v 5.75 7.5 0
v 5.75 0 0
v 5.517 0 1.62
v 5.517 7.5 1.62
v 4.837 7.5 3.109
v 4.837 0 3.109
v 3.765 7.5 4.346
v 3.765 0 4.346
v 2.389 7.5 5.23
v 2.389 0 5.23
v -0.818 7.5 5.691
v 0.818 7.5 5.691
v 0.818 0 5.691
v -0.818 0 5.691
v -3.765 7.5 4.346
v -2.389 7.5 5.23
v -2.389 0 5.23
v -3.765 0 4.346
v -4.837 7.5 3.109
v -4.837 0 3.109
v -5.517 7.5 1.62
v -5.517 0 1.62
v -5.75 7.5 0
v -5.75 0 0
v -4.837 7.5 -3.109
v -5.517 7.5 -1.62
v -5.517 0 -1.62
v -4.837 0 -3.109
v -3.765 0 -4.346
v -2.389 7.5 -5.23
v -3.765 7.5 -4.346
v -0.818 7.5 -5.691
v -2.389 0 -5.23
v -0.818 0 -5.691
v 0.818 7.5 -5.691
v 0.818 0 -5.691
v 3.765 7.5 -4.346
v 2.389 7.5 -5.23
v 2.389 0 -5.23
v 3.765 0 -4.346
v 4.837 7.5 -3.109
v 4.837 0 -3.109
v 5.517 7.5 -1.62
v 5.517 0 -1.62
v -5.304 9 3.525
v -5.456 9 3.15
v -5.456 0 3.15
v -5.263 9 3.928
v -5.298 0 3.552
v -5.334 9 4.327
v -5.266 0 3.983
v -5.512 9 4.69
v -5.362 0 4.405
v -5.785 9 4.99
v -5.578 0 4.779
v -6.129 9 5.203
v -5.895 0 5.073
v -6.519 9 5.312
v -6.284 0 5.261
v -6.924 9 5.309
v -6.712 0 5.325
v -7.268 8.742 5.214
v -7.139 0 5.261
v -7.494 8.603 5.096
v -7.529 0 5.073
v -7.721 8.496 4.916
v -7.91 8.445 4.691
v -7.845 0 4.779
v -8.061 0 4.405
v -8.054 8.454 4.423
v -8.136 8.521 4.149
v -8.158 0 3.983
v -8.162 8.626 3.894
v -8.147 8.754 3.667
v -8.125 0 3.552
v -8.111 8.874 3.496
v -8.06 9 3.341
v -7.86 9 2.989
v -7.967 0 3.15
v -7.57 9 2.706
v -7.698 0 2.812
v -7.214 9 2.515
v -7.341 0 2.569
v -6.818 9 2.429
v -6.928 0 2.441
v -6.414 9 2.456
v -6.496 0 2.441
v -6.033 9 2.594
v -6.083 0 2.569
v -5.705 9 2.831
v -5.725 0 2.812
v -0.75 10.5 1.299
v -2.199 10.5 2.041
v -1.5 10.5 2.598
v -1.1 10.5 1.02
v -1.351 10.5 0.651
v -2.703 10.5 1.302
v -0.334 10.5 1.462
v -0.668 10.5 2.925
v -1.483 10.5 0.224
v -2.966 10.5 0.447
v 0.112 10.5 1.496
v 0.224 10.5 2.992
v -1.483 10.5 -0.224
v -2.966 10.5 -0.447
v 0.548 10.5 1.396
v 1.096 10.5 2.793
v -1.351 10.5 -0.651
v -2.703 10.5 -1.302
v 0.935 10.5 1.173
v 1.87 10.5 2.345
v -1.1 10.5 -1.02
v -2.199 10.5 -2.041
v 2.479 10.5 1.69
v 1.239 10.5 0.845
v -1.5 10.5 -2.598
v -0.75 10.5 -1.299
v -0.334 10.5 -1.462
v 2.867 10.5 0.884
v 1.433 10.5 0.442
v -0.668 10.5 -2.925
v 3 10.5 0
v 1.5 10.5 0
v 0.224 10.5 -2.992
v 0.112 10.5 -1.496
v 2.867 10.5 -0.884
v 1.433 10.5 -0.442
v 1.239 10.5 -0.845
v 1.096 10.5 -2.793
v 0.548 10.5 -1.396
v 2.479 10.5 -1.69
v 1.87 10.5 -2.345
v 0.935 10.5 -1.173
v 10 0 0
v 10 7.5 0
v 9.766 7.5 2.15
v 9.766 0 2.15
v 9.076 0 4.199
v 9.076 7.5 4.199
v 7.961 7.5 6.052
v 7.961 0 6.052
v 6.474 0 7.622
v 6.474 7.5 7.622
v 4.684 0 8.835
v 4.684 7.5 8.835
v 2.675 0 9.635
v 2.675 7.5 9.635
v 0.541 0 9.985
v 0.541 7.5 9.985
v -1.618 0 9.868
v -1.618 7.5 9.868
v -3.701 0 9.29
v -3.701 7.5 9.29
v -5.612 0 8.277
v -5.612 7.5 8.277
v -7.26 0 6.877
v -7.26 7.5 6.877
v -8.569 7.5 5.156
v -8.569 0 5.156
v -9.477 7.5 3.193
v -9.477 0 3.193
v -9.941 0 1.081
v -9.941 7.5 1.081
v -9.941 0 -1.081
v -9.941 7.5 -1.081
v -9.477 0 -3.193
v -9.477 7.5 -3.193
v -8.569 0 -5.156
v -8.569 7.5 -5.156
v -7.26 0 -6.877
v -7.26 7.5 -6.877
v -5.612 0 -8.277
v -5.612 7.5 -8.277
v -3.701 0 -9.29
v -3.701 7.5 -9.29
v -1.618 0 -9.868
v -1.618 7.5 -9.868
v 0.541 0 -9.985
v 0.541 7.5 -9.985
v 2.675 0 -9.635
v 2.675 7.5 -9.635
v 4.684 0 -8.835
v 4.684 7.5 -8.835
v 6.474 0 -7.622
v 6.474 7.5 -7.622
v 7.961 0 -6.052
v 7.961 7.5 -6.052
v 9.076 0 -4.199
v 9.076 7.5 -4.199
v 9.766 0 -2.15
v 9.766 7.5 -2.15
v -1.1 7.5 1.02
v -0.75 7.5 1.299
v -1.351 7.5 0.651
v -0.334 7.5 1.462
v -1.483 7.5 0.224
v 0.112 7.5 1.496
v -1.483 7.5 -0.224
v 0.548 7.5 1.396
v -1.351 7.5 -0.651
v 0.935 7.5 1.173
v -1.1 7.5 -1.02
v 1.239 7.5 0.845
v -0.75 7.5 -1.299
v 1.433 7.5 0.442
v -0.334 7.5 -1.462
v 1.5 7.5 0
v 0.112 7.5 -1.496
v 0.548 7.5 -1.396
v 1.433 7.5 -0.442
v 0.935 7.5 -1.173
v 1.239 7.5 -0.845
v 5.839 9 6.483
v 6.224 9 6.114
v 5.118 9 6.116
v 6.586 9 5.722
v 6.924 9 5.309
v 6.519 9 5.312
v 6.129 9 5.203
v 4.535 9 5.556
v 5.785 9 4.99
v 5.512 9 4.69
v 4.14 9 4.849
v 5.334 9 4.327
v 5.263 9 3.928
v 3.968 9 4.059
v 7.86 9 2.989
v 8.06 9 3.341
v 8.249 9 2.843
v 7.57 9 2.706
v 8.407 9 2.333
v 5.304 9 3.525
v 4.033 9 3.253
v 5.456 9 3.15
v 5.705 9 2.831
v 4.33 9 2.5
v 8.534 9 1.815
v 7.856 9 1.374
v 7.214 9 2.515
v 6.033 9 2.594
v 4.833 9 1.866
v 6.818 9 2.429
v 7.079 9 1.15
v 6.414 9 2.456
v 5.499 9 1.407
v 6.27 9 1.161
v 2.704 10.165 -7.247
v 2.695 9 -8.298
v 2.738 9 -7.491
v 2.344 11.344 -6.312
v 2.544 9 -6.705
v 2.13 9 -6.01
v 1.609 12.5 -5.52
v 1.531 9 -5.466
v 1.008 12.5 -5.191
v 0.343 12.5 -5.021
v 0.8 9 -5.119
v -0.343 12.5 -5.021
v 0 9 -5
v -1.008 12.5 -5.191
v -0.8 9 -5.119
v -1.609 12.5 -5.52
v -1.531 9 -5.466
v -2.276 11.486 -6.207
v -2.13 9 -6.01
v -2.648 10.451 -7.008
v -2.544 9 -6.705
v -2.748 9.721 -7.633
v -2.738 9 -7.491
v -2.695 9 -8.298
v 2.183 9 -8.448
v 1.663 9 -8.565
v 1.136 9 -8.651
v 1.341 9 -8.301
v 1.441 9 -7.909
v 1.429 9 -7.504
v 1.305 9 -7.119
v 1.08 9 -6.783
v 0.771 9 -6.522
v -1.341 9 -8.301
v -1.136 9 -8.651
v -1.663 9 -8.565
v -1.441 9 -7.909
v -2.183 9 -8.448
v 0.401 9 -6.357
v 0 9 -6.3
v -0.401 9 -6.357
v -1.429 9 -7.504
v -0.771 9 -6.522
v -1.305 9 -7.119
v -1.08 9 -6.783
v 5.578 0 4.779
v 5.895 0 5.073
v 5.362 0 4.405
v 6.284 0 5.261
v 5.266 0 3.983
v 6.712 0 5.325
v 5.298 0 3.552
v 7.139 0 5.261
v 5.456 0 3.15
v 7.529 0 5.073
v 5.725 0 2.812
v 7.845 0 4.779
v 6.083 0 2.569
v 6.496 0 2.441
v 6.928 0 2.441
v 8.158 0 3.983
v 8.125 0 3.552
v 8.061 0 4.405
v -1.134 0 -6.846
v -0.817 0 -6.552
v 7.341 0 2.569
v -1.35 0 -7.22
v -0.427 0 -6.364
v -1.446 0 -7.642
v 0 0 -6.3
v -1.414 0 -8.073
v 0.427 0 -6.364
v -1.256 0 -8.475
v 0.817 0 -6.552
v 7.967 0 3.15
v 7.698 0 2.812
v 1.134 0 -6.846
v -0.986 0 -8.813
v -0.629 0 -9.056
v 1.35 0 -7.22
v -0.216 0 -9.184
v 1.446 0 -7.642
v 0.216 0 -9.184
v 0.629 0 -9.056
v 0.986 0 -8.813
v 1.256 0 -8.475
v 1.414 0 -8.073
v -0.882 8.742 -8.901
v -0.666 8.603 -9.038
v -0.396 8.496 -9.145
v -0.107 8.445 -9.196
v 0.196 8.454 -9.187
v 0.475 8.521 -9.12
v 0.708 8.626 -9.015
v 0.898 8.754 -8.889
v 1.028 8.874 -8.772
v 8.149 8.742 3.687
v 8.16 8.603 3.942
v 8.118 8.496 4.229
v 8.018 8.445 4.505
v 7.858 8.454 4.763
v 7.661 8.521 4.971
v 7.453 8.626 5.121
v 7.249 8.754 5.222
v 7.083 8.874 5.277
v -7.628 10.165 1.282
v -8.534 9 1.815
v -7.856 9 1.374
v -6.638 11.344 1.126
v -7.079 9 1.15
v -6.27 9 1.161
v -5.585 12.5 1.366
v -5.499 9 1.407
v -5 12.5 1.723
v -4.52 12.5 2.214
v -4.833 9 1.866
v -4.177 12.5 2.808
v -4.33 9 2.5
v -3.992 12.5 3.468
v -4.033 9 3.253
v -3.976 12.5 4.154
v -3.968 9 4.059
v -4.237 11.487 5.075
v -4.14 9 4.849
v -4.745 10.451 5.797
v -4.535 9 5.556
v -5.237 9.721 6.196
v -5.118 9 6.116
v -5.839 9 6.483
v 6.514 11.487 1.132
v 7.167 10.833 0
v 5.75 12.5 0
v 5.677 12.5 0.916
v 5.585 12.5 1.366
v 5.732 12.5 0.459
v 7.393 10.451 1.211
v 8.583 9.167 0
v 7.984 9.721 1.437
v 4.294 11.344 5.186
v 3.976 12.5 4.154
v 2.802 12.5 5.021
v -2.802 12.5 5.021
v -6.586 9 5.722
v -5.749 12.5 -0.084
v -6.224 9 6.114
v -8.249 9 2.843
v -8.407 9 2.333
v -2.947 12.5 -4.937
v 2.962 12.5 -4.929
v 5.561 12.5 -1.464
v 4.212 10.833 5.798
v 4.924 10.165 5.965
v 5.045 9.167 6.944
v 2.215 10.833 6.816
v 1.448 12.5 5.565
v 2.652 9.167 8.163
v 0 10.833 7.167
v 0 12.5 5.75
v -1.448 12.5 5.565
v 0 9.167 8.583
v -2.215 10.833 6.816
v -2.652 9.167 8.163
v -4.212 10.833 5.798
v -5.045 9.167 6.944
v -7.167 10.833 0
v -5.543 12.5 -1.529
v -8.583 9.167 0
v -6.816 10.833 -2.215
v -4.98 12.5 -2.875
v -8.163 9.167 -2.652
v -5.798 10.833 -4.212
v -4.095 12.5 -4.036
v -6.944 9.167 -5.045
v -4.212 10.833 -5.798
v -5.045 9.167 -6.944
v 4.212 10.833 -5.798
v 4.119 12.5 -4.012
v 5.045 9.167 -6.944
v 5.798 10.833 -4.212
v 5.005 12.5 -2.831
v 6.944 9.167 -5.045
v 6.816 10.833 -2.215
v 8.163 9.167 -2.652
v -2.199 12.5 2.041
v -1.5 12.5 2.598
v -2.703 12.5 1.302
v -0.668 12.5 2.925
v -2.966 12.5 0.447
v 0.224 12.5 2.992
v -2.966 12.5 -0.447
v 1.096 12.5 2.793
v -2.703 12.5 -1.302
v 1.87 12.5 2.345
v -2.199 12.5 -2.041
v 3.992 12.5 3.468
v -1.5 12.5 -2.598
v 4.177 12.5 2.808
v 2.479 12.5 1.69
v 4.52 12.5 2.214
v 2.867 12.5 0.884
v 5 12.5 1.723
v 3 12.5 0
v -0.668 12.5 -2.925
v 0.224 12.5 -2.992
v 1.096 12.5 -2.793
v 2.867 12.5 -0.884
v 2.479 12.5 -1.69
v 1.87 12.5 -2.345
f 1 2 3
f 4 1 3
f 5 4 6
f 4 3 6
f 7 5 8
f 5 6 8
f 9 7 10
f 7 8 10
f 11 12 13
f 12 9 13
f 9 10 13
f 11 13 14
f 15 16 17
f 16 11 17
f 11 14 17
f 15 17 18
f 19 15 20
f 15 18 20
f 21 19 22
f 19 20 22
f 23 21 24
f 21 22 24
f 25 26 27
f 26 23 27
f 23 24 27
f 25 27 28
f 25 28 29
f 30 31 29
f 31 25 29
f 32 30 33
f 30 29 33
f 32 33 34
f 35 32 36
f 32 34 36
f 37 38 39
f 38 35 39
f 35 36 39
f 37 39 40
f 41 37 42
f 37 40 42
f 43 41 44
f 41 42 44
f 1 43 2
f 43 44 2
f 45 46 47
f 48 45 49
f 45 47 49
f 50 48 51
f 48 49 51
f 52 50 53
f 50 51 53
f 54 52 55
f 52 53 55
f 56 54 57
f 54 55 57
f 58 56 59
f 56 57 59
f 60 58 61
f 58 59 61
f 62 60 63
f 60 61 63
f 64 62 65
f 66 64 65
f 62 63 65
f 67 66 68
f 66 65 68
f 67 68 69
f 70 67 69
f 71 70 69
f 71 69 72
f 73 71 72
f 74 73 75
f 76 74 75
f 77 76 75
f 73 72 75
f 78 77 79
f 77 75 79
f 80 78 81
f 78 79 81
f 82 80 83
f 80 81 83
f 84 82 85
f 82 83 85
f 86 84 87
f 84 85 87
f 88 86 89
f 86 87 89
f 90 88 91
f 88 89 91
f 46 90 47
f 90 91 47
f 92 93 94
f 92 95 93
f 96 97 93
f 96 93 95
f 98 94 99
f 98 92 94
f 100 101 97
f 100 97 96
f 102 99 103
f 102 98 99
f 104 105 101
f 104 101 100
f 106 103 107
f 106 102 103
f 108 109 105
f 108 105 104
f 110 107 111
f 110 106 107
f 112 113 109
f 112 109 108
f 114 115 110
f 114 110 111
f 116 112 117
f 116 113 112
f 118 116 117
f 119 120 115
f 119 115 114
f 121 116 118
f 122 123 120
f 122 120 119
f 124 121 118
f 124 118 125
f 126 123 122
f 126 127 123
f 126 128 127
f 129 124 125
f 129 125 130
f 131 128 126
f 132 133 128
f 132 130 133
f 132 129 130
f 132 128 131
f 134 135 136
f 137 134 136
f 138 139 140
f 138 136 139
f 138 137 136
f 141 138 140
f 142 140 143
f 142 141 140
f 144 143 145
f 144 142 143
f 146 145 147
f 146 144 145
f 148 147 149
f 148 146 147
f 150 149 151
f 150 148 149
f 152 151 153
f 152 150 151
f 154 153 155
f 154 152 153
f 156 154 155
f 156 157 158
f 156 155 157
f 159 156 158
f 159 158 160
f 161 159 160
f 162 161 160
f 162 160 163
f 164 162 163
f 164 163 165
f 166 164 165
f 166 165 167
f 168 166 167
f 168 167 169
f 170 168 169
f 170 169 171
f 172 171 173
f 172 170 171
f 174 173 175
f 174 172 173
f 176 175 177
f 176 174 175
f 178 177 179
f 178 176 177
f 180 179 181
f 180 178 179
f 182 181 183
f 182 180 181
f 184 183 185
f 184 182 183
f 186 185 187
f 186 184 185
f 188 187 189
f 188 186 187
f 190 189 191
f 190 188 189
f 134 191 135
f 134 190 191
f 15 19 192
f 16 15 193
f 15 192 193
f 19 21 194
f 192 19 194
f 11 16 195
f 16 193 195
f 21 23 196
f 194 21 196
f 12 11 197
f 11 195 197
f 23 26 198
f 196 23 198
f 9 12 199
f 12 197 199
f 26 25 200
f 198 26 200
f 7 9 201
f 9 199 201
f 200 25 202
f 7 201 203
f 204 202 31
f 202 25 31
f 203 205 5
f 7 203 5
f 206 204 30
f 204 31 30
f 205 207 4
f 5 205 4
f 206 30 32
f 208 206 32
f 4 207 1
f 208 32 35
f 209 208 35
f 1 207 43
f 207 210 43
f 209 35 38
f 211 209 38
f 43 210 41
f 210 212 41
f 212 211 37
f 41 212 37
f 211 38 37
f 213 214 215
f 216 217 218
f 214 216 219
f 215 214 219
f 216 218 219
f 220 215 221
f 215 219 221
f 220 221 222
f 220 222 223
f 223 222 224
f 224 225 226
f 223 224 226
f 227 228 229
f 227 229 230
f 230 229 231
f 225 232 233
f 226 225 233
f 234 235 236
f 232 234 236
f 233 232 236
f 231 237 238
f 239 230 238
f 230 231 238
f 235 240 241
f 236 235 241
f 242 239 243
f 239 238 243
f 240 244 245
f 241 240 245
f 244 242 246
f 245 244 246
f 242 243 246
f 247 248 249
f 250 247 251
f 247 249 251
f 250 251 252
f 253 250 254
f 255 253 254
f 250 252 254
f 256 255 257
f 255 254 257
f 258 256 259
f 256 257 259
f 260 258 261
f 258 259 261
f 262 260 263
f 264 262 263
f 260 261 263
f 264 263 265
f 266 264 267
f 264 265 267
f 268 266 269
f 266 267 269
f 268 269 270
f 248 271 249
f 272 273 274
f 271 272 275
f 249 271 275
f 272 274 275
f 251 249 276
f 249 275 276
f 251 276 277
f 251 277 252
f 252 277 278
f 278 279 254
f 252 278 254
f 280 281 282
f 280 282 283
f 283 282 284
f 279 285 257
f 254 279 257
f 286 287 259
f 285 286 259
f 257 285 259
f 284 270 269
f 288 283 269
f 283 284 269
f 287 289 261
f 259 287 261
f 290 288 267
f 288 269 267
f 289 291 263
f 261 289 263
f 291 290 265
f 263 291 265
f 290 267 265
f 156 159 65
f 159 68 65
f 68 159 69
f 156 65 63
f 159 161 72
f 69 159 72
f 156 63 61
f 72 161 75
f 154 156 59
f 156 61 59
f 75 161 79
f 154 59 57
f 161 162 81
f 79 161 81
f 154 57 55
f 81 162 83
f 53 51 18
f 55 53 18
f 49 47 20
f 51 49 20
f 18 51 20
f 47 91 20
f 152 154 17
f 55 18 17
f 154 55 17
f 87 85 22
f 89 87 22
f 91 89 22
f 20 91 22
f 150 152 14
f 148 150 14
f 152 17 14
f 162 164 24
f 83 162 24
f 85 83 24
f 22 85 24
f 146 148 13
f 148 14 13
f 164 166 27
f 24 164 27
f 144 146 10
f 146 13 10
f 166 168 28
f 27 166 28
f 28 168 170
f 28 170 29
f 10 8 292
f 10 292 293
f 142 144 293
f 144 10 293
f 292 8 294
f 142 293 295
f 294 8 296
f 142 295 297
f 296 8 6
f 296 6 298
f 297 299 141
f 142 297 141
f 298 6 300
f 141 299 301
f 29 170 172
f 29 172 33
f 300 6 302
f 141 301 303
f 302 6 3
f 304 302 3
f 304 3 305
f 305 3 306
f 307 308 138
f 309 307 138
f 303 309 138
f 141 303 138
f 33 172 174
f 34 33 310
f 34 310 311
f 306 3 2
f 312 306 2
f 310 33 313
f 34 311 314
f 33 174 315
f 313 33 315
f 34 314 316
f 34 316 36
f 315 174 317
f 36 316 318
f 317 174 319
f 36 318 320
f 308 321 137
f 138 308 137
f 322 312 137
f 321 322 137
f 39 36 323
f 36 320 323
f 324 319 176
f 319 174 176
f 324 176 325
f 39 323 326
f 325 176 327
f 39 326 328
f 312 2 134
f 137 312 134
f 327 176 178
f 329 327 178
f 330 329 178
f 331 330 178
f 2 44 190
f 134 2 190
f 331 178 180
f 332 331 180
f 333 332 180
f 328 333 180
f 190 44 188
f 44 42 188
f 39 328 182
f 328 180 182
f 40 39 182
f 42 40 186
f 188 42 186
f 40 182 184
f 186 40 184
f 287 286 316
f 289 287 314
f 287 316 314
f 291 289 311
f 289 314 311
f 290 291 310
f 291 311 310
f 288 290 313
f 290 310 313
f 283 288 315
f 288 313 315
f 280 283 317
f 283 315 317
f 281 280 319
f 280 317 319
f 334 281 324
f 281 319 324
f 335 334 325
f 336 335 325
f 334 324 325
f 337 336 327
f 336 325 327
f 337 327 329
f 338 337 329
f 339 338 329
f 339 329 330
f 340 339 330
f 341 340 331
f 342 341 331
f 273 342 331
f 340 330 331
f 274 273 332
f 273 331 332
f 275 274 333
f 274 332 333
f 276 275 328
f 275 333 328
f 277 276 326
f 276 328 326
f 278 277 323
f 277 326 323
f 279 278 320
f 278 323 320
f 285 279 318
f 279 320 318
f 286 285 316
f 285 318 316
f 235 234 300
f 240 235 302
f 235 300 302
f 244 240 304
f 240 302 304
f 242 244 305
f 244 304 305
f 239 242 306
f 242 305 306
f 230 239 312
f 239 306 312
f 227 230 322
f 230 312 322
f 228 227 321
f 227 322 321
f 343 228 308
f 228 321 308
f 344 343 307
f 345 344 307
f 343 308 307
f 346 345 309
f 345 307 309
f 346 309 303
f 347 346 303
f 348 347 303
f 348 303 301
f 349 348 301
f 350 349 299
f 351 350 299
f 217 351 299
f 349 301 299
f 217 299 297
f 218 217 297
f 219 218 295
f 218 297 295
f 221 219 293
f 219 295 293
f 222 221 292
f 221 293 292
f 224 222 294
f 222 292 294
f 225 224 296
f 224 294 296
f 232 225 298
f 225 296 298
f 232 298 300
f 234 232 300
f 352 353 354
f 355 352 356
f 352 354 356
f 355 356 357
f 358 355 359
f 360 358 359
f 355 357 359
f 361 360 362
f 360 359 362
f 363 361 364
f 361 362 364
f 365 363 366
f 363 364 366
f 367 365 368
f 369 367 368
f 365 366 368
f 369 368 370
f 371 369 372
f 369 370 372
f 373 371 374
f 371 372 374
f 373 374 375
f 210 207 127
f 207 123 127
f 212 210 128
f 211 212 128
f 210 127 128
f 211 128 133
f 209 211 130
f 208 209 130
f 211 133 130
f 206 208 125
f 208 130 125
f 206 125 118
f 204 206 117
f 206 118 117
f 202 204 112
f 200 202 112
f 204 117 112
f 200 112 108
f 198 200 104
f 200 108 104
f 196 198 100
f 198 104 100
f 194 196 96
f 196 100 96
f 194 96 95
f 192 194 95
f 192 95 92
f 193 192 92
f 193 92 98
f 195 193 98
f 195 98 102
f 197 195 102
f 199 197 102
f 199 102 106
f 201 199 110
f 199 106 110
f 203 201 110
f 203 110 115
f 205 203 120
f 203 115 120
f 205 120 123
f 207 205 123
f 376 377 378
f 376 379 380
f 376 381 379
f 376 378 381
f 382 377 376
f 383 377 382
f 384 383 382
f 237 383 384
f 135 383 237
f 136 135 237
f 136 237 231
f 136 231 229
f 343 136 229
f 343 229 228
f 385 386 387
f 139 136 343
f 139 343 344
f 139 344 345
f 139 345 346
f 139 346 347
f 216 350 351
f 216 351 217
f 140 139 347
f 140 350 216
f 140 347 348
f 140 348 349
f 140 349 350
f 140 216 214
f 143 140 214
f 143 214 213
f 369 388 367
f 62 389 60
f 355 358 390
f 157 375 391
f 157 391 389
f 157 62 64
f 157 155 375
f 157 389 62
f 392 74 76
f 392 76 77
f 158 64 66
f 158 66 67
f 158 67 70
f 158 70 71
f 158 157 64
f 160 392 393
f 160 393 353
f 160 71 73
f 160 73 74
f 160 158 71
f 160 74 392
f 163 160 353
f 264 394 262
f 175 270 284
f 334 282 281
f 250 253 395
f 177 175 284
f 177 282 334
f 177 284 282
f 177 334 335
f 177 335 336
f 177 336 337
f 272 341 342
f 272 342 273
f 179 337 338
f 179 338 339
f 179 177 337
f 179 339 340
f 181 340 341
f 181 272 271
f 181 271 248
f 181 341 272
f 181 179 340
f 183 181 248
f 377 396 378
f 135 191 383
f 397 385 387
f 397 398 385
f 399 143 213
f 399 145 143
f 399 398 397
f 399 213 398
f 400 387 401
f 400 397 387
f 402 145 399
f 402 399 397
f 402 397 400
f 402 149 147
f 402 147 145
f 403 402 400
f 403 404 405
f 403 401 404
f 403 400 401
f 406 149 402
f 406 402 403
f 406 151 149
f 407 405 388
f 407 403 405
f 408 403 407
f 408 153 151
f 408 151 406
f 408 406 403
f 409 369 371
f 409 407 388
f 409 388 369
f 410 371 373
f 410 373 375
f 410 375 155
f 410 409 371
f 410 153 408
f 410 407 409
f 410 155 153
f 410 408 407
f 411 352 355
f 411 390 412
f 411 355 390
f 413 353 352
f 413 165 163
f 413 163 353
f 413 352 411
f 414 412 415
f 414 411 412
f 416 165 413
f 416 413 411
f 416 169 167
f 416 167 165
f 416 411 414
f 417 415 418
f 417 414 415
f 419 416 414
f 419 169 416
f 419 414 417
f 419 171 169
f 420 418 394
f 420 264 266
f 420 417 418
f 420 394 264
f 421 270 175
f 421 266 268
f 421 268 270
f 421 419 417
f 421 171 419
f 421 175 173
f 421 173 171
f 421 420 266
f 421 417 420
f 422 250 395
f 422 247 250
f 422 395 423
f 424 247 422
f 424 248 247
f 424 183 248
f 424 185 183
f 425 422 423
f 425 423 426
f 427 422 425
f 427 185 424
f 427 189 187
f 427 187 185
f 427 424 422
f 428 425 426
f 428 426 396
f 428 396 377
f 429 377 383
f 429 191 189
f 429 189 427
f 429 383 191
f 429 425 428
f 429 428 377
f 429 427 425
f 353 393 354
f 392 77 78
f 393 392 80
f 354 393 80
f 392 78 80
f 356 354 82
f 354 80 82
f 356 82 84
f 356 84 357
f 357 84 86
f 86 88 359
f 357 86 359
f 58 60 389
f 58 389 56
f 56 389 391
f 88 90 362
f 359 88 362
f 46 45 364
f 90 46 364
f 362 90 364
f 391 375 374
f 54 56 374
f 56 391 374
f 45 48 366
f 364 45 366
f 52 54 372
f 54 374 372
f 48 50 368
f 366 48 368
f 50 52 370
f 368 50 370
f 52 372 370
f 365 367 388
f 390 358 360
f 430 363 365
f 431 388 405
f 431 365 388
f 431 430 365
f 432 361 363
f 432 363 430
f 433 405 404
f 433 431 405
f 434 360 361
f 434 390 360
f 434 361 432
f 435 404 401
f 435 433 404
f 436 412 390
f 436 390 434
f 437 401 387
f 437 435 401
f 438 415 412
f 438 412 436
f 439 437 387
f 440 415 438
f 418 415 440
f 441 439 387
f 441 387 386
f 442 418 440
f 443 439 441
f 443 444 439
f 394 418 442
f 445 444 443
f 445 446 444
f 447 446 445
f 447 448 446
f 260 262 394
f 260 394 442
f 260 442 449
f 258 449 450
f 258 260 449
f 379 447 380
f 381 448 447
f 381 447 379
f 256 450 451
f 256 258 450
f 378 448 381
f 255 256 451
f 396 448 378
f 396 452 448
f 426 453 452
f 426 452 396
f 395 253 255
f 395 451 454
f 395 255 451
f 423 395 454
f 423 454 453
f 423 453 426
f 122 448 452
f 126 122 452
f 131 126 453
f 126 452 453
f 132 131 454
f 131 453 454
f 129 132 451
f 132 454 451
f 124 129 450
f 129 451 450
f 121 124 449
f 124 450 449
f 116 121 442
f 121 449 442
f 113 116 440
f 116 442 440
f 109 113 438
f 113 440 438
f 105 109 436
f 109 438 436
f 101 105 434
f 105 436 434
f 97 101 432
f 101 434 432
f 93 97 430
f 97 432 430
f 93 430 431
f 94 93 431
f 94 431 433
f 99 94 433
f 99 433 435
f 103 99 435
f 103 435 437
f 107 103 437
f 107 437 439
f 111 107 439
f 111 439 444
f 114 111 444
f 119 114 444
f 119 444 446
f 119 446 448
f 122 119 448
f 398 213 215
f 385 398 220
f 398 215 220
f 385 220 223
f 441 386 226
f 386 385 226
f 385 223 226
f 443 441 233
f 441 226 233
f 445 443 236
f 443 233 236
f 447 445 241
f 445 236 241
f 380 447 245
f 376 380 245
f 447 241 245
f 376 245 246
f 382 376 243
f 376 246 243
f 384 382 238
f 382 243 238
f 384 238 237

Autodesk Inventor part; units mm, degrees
ref_plane "YZ Plane" through (0, 0, 0) normal (1, 0, 0) x (0, 1, 0)
ref_plane "XZ Plane" through (0, 0, 0) normal (0, 1, 0) x (-1, 0, 0)
ref_plane "XY Plane" through (0, 0, 0) normal (0, 0, 1) x (1, 0, 0)
sketch "Sketch2" plane through (0, 0, 0) normal (0, 0, 1) x (1, 0, 0)
  line L0 (1.5, 7.5) -> (1.5, 10.5)
  line L1 (1.5, 10.5) -> (3, 10.5)
  line L2 (3, 10.5) -> (3, 12.5)
  line L3 (3, 12.5) -> (5.75, 12.5)
  line L4 (5.75, 12.5) -> (10, 7.5)
  line L5 (10, 7.5) -> (10, 0)
  line L6 (1.5, 7.5) -> (5.75, 7.5)
  line L7 (5.75, 7.5) -> (5.75, 0)
  line L8 (5.75, 0) -> (10, 0)
  line L9 (0, 0) -> (0, 19.425)
  dimension "d0" = 6
  dimension "d1" = 3
  dimension "d2" = 11.5
  dimension "d3" = 20
  dimension "d4" = 7.5
  dimension "d5" = 3
  dimension "d6" = 2
revolve "Revolution1" add sketch "Sketch2" angle 360 about axis through (0, 0, 0) along (0, 1, 0)
sketch "Sketch3" plane through (0, 12.5, 0) normal (0, 1, 0) x (1, 0, 0)
  point P0 (0, 0)
  point P1 (0, 7.75)
  dimension "d8" = 7.75
hole "Hole1" at (0, 12.5, -7.75) direction (0, -1, 0) diameter 2.9 end through all counterbore diameter 5.5 counterbore depth 3.5 clearance for "Socket Head Cap Screw DIN EN ISO 4762" size "M2.5" standard "DIN"
pattern_circular "Circular Pattern1" count 3 over 360 about axis through (0, -10, 0) along (0, 1, 0) of "Hole1"
properties part number "902-4250 magnet hold"
